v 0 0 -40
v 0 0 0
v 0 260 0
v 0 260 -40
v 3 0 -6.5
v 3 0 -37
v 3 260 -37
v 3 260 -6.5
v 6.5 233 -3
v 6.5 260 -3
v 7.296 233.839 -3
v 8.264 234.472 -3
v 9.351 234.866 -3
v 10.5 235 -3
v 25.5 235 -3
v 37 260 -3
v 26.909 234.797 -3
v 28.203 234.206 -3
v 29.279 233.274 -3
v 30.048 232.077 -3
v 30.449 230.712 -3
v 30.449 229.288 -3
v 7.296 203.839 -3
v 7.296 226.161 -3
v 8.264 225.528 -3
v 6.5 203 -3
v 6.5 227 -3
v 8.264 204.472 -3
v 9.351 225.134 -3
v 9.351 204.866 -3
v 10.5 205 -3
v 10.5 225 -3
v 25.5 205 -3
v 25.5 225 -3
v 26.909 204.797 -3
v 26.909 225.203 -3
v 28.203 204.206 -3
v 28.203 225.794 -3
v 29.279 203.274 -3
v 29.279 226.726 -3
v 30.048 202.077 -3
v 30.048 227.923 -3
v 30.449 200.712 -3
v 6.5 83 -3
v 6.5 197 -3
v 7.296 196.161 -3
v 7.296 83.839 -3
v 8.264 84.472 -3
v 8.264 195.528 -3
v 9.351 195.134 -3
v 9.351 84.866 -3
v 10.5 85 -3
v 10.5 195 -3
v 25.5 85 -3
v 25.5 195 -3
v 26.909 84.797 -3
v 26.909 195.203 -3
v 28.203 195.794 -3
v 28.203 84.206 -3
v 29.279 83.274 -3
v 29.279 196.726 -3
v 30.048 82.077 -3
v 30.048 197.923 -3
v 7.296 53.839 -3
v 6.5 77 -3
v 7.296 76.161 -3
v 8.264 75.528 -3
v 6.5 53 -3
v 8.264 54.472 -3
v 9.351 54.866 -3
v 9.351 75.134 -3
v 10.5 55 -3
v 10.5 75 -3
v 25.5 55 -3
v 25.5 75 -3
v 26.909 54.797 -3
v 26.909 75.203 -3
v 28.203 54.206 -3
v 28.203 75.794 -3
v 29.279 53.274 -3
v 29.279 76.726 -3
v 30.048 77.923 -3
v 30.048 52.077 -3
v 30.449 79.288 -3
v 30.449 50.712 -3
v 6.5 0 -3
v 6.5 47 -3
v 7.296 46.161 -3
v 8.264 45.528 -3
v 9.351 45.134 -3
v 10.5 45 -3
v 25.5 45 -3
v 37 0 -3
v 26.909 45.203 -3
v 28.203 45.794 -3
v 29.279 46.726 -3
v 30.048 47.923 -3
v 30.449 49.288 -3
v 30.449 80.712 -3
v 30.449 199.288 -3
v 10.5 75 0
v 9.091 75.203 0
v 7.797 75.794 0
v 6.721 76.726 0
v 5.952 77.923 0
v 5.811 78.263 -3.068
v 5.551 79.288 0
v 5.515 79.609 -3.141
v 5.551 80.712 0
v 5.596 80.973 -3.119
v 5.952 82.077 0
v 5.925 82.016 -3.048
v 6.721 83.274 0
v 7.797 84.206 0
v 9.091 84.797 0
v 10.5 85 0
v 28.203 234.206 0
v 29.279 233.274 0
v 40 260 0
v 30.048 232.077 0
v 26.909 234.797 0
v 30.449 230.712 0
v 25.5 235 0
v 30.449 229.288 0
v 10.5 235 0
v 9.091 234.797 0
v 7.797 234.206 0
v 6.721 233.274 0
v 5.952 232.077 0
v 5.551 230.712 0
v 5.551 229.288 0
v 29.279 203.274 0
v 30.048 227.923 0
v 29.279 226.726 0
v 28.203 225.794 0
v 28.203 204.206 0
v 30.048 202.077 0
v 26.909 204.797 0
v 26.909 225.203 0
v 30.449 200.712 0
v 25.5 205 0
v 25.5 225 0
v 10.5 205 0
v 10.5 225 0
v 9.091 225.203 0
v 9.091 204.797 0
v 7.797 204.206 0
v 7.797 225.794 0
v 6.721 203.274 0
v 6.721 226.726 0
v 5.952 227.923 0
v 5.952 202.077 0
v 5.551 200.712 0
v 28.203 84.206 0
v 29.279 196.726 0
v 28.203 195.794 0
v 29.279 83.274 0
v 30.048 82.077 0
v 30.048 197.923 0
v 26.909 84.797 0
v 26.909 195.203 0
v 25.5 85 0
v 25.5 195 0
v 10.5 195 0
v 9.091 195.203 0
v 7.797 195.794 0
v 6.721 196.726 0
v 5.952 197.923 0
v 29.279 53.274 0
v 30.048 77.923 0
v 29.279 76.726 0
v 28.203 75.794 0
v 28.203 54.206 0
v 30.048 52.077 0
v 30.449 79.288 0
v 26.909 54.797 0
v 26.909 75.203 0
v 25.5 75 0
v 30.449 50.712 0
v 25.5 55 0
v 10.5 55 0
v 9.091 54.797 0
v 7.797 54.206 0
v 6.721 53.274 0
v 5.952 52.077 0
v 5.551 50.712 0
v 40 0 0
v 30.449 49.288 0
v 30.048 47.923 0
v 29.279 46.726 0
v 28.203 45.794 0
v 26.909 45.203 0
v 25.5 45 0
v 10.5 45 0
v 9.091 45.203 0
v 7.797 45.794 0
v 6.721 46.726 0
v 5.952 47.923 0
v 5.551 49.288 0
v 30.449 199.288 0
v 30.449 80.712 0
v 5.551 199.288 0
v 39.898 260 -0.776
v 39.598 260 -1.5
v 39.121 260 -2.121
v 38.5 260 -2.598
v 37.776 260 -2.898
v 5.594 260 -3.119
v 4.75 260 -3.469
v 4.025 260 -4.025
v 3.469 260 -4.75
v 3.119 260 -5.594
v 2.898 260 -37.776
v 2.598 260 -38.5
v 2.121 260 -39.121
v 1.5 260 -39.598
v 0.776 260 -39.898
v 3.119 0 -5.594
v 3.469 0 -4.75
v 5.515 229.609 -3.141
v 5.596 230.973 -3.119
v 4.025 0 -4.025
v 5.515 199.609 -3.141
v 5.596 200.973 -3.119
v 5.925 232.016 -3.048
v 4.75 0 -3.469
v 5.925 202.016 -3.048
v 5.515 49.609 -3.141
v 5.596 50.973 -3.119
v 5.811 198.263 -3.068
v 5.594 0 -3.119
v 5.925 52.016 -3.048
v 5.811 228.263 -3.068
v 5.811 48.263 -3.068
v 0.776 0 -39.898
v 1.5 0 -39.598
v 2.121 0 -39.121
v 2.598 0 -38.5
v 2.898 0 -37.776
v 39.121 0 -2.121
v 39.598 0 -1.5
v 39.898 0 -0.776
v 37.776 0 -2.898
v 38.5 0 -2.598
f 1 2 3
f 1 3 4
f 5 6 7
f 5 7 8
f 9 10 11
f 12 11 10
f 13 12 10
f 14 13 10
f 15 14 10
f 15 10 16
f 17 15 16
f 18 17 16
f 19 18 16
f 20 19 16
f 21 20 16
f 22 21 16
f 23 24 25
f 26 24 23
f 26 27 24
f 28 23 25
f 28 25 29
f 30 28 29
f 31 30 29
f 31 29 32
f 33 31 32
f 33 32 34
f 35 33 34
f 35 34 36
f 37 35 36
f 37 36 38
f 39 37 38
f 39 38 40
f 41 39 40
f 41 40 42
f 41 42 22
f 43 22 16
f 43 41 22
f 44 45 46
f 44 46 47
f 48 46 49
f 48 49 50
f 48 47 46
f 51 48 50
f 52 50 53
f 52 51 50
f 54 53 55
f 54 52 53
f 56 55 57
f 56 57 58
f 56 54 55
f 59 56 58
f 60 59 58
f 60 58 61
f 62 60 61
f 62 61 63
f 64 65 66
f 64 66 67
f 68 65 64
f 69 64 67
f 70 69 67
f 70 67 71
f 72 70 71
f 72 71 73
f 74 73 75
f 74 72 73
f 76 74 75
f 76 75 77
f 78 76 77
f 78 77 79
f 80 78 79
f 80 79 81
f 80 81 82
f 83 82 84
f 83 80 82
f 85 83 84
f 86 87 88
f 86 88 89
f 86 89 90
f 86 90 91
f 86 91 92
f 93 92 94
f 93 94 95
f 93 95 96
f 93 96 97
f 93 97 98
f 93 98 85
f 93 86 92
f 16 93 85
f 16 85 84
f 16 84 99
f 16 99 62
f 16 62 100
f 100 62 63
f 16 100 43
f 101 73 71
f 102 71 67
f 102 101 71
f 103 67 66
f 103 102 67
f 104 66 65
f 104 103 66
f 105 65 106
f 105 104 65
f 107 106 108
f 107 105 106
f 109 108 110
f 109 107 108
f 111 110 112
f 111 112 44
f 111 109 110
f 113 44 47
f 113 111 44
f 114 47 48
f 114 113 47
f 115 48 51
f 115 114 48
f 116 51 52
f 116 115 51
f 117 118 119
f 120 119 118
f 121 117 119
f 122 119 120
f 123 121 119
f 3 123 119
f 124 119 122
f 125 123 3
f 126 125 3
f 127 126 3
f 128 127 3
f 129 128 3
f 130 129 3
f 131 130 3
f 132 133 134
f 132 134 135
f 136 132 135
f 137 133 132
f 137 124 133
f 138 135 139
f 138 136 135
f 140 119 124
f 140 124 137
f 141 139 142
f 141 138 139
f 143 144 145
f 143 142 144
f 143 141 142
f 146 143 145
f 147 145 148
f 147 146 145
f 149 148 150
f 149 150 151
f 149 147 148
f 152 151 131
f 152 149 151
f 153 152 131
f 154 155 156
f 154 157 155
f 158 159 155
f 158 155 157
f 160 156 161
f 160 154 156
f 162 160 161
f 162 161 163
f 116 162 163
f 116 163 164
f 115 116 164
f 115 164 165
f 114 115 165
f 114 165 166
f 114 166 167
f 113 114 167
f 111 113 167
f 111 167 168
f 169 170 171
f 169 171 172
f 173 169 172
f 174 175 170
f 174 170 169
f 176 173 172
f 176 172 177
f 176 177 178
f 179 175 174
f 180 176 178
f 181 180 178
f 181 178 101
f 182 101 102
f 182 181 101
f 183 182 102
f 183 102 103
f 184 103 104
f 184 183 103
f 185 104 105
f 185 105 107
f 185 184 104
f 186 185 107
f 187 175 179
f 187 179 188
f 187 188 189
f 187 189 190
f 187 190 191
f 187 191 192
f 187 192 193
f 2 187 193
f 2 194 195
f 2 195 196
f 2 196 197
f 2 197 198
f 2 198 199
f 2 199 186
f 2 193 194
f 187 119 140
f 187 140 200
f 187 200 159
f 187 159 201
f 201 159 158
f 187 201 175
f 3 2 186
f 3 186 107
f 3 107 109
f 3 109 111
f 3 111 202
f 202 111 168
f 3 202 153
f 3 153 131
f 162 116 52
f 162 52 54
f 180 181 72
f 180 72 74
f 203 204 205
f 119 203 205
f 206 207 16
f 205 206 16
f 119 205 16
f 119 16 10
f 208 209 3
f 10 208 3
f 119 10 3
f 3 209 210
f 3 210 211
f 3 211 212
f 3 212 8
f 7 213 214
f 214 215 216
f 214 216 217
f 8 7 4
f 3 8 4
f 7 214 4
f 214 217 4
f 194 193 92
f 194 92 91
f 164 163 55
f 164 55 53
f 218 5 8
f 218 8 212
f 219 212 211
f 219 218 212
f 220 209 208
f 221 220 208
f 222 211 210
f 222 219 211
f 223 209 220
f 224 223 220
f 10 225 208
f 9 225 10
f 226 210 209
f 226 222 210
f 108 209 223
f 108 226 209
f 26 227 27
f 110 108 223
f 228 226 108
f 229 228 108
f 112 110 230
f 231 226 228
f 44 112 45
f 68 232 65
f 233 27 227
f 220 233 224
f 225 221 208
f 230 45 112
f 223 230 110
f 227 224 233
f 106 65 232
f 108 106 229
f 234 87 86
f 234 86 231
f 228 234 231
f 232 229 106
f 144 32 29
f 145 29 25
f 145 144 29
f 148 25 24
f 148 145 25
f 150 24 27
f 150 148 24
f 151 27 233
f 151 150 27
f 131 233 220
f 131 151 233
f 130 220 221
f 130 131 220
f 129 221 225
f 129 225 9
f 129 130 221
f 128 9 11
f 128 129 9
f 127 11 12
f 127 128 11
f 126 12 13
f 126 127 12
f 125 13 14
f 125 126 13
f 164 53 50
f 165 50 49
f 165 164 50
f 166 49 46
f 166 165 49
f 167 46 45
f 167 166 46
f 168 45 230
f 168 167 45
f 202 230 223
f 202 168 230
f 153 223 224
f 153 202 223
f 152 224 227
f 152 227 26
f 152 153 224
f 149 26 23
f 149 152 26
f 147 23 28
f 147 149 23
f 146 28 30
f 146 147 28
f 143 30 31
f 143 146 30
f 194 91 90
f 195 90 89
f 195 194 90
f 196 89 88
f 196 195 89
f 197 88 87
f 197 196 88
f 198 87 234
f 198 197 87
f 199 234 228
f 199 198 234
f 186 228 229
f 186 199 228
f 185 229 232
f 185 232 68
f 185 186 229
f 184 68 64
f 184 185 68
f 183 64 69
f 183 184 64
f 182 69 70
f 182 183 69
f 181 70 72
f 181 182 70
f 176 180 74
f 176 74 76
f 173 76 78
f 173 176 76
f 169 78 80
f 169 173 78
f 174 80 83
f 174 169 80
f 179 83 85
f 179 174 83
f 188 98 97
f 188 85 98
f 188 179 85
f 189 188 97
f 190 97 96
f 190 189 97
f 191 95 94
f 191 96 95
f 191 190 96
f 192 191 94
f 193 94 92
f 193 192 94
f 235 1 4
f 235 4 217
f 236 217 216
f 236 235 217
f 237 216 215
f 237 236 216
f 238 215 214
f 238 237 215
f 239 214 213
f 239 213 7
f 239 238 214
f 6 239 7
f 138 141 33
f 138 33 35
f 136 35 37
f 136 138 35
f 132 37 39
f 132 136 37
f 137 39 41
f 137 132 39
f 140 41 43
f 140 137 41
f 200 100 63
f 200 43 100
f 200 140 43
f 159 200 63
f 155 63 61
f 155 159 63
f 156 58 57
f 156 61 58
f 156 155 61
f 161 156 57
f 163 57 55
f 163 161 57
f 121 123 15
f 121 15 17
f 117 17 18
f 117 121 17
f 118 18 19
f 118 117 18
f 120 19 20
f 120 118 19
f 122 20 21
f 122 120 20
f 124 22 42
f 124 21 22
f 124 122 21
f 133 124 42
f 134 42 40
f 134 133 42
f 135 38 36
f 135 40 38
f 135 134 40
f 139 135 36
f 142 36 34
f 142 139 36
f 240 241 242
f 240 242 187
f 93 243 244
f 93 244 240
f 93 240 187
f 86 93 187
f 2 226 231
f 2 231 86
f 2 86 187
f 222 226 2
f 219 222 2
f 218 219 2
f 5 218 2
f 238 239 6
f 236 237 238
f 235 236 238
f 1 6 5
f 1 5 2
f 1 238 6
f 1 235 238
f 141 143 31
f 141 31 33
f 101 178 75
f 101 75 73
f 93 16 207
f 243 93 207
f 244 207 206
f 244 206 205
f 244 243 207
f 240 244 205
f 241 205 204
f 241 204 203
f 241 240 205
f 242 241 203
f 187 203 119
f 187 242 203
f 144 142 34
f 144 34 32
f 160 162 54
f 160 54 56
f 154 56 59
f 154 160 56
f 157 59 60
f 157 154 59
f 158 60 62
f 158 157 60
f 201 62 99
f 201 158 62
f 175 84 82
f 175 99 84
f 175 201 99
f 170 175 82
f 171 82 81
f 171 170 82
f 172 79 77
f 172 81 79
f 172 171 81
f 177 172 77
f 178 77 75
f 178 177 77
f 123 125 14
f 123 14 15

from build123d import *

# Parameters (mm, degrees)
IRON_V40X40X3_1_DEPTH = 260
CUT_EXTRUDE1_DEPTH    = 10


with BuildPart() as part:
    # Sketch1 → Iron V40X40X3(1) (new body)
    with BuildSketch(Plane(origin=(0, 0, 0), x_dir=(1, 0, 0), z_dir=(0, 1, 0))):
        with BuildLine():
            Line((0, 0), (0, 40))
            ThreePointArc((0, 40), (2.121320344, 39.121320344), (3, 37))
            Line((3, 37), (3, 6.5))
            ThreePointArc((3, 6.5), (4.025126266, 4.025126266), (6.5, 3))
            Line((6.5, 3), (37, 3))
            ThreePointArc((37, 3), (39.121320344, 2.121320344), (40, 0))
            Line((40, 0), (0, 0))
        make_face()
    extrude(amount=IRON_V40X40X3_1_DEPTH)

    # Sketch2 → Cut-Extrude1 (cut)
    with BuildSketch(Plane.XY):
        with BuildLine():
            Line((10.5, 55), (25.5, 55))
            ThreePointArc((25.5, 55), (30.5, 50), (25.5, 45))
            Line((25.5, 45), (10.5, 45))
            ThreePointArc((10.5, 45), (5.5, 50), (10.5, 55))
        make_face()
        with BuildLine():
            Line((10.5, 85), (25.5, 85))
            ThreePointArc((25.5, 85), (30.5, 80), (25.5, 75))
            Line((25.5, 75), (10.5, 75))
            ThreePointArc((10.5, 75), (5.5, 80), (10.5, 85))
        make_face()
        with BuildLine():
            Line((10.5, 205), (25.5, 205))
            ThreePointArc((25.5, 205), (30.5, 200), (25.5, 195))
            Line((25.5, 195), (10.5, 195))
            ThreePointArc((10.5, 195), (5.5, 200), (10.5, 205))
        make_face()
        with BuildLine():
            Line((10.5, 235), (25.5, 235))
            ThreePointArc((25.5, 235), (30.5, 230), (25.5, 225))
            Line((25.5, 225), (10.5, 225))
            ThreePointArc((10.5, 225), (5.5, 230), (10.5, 235))
        make_face()
    extrude(amount=-CUT_EXTRUDE1_DEPTH, mode=Mode.SUBTRACT)


solid = part.part
